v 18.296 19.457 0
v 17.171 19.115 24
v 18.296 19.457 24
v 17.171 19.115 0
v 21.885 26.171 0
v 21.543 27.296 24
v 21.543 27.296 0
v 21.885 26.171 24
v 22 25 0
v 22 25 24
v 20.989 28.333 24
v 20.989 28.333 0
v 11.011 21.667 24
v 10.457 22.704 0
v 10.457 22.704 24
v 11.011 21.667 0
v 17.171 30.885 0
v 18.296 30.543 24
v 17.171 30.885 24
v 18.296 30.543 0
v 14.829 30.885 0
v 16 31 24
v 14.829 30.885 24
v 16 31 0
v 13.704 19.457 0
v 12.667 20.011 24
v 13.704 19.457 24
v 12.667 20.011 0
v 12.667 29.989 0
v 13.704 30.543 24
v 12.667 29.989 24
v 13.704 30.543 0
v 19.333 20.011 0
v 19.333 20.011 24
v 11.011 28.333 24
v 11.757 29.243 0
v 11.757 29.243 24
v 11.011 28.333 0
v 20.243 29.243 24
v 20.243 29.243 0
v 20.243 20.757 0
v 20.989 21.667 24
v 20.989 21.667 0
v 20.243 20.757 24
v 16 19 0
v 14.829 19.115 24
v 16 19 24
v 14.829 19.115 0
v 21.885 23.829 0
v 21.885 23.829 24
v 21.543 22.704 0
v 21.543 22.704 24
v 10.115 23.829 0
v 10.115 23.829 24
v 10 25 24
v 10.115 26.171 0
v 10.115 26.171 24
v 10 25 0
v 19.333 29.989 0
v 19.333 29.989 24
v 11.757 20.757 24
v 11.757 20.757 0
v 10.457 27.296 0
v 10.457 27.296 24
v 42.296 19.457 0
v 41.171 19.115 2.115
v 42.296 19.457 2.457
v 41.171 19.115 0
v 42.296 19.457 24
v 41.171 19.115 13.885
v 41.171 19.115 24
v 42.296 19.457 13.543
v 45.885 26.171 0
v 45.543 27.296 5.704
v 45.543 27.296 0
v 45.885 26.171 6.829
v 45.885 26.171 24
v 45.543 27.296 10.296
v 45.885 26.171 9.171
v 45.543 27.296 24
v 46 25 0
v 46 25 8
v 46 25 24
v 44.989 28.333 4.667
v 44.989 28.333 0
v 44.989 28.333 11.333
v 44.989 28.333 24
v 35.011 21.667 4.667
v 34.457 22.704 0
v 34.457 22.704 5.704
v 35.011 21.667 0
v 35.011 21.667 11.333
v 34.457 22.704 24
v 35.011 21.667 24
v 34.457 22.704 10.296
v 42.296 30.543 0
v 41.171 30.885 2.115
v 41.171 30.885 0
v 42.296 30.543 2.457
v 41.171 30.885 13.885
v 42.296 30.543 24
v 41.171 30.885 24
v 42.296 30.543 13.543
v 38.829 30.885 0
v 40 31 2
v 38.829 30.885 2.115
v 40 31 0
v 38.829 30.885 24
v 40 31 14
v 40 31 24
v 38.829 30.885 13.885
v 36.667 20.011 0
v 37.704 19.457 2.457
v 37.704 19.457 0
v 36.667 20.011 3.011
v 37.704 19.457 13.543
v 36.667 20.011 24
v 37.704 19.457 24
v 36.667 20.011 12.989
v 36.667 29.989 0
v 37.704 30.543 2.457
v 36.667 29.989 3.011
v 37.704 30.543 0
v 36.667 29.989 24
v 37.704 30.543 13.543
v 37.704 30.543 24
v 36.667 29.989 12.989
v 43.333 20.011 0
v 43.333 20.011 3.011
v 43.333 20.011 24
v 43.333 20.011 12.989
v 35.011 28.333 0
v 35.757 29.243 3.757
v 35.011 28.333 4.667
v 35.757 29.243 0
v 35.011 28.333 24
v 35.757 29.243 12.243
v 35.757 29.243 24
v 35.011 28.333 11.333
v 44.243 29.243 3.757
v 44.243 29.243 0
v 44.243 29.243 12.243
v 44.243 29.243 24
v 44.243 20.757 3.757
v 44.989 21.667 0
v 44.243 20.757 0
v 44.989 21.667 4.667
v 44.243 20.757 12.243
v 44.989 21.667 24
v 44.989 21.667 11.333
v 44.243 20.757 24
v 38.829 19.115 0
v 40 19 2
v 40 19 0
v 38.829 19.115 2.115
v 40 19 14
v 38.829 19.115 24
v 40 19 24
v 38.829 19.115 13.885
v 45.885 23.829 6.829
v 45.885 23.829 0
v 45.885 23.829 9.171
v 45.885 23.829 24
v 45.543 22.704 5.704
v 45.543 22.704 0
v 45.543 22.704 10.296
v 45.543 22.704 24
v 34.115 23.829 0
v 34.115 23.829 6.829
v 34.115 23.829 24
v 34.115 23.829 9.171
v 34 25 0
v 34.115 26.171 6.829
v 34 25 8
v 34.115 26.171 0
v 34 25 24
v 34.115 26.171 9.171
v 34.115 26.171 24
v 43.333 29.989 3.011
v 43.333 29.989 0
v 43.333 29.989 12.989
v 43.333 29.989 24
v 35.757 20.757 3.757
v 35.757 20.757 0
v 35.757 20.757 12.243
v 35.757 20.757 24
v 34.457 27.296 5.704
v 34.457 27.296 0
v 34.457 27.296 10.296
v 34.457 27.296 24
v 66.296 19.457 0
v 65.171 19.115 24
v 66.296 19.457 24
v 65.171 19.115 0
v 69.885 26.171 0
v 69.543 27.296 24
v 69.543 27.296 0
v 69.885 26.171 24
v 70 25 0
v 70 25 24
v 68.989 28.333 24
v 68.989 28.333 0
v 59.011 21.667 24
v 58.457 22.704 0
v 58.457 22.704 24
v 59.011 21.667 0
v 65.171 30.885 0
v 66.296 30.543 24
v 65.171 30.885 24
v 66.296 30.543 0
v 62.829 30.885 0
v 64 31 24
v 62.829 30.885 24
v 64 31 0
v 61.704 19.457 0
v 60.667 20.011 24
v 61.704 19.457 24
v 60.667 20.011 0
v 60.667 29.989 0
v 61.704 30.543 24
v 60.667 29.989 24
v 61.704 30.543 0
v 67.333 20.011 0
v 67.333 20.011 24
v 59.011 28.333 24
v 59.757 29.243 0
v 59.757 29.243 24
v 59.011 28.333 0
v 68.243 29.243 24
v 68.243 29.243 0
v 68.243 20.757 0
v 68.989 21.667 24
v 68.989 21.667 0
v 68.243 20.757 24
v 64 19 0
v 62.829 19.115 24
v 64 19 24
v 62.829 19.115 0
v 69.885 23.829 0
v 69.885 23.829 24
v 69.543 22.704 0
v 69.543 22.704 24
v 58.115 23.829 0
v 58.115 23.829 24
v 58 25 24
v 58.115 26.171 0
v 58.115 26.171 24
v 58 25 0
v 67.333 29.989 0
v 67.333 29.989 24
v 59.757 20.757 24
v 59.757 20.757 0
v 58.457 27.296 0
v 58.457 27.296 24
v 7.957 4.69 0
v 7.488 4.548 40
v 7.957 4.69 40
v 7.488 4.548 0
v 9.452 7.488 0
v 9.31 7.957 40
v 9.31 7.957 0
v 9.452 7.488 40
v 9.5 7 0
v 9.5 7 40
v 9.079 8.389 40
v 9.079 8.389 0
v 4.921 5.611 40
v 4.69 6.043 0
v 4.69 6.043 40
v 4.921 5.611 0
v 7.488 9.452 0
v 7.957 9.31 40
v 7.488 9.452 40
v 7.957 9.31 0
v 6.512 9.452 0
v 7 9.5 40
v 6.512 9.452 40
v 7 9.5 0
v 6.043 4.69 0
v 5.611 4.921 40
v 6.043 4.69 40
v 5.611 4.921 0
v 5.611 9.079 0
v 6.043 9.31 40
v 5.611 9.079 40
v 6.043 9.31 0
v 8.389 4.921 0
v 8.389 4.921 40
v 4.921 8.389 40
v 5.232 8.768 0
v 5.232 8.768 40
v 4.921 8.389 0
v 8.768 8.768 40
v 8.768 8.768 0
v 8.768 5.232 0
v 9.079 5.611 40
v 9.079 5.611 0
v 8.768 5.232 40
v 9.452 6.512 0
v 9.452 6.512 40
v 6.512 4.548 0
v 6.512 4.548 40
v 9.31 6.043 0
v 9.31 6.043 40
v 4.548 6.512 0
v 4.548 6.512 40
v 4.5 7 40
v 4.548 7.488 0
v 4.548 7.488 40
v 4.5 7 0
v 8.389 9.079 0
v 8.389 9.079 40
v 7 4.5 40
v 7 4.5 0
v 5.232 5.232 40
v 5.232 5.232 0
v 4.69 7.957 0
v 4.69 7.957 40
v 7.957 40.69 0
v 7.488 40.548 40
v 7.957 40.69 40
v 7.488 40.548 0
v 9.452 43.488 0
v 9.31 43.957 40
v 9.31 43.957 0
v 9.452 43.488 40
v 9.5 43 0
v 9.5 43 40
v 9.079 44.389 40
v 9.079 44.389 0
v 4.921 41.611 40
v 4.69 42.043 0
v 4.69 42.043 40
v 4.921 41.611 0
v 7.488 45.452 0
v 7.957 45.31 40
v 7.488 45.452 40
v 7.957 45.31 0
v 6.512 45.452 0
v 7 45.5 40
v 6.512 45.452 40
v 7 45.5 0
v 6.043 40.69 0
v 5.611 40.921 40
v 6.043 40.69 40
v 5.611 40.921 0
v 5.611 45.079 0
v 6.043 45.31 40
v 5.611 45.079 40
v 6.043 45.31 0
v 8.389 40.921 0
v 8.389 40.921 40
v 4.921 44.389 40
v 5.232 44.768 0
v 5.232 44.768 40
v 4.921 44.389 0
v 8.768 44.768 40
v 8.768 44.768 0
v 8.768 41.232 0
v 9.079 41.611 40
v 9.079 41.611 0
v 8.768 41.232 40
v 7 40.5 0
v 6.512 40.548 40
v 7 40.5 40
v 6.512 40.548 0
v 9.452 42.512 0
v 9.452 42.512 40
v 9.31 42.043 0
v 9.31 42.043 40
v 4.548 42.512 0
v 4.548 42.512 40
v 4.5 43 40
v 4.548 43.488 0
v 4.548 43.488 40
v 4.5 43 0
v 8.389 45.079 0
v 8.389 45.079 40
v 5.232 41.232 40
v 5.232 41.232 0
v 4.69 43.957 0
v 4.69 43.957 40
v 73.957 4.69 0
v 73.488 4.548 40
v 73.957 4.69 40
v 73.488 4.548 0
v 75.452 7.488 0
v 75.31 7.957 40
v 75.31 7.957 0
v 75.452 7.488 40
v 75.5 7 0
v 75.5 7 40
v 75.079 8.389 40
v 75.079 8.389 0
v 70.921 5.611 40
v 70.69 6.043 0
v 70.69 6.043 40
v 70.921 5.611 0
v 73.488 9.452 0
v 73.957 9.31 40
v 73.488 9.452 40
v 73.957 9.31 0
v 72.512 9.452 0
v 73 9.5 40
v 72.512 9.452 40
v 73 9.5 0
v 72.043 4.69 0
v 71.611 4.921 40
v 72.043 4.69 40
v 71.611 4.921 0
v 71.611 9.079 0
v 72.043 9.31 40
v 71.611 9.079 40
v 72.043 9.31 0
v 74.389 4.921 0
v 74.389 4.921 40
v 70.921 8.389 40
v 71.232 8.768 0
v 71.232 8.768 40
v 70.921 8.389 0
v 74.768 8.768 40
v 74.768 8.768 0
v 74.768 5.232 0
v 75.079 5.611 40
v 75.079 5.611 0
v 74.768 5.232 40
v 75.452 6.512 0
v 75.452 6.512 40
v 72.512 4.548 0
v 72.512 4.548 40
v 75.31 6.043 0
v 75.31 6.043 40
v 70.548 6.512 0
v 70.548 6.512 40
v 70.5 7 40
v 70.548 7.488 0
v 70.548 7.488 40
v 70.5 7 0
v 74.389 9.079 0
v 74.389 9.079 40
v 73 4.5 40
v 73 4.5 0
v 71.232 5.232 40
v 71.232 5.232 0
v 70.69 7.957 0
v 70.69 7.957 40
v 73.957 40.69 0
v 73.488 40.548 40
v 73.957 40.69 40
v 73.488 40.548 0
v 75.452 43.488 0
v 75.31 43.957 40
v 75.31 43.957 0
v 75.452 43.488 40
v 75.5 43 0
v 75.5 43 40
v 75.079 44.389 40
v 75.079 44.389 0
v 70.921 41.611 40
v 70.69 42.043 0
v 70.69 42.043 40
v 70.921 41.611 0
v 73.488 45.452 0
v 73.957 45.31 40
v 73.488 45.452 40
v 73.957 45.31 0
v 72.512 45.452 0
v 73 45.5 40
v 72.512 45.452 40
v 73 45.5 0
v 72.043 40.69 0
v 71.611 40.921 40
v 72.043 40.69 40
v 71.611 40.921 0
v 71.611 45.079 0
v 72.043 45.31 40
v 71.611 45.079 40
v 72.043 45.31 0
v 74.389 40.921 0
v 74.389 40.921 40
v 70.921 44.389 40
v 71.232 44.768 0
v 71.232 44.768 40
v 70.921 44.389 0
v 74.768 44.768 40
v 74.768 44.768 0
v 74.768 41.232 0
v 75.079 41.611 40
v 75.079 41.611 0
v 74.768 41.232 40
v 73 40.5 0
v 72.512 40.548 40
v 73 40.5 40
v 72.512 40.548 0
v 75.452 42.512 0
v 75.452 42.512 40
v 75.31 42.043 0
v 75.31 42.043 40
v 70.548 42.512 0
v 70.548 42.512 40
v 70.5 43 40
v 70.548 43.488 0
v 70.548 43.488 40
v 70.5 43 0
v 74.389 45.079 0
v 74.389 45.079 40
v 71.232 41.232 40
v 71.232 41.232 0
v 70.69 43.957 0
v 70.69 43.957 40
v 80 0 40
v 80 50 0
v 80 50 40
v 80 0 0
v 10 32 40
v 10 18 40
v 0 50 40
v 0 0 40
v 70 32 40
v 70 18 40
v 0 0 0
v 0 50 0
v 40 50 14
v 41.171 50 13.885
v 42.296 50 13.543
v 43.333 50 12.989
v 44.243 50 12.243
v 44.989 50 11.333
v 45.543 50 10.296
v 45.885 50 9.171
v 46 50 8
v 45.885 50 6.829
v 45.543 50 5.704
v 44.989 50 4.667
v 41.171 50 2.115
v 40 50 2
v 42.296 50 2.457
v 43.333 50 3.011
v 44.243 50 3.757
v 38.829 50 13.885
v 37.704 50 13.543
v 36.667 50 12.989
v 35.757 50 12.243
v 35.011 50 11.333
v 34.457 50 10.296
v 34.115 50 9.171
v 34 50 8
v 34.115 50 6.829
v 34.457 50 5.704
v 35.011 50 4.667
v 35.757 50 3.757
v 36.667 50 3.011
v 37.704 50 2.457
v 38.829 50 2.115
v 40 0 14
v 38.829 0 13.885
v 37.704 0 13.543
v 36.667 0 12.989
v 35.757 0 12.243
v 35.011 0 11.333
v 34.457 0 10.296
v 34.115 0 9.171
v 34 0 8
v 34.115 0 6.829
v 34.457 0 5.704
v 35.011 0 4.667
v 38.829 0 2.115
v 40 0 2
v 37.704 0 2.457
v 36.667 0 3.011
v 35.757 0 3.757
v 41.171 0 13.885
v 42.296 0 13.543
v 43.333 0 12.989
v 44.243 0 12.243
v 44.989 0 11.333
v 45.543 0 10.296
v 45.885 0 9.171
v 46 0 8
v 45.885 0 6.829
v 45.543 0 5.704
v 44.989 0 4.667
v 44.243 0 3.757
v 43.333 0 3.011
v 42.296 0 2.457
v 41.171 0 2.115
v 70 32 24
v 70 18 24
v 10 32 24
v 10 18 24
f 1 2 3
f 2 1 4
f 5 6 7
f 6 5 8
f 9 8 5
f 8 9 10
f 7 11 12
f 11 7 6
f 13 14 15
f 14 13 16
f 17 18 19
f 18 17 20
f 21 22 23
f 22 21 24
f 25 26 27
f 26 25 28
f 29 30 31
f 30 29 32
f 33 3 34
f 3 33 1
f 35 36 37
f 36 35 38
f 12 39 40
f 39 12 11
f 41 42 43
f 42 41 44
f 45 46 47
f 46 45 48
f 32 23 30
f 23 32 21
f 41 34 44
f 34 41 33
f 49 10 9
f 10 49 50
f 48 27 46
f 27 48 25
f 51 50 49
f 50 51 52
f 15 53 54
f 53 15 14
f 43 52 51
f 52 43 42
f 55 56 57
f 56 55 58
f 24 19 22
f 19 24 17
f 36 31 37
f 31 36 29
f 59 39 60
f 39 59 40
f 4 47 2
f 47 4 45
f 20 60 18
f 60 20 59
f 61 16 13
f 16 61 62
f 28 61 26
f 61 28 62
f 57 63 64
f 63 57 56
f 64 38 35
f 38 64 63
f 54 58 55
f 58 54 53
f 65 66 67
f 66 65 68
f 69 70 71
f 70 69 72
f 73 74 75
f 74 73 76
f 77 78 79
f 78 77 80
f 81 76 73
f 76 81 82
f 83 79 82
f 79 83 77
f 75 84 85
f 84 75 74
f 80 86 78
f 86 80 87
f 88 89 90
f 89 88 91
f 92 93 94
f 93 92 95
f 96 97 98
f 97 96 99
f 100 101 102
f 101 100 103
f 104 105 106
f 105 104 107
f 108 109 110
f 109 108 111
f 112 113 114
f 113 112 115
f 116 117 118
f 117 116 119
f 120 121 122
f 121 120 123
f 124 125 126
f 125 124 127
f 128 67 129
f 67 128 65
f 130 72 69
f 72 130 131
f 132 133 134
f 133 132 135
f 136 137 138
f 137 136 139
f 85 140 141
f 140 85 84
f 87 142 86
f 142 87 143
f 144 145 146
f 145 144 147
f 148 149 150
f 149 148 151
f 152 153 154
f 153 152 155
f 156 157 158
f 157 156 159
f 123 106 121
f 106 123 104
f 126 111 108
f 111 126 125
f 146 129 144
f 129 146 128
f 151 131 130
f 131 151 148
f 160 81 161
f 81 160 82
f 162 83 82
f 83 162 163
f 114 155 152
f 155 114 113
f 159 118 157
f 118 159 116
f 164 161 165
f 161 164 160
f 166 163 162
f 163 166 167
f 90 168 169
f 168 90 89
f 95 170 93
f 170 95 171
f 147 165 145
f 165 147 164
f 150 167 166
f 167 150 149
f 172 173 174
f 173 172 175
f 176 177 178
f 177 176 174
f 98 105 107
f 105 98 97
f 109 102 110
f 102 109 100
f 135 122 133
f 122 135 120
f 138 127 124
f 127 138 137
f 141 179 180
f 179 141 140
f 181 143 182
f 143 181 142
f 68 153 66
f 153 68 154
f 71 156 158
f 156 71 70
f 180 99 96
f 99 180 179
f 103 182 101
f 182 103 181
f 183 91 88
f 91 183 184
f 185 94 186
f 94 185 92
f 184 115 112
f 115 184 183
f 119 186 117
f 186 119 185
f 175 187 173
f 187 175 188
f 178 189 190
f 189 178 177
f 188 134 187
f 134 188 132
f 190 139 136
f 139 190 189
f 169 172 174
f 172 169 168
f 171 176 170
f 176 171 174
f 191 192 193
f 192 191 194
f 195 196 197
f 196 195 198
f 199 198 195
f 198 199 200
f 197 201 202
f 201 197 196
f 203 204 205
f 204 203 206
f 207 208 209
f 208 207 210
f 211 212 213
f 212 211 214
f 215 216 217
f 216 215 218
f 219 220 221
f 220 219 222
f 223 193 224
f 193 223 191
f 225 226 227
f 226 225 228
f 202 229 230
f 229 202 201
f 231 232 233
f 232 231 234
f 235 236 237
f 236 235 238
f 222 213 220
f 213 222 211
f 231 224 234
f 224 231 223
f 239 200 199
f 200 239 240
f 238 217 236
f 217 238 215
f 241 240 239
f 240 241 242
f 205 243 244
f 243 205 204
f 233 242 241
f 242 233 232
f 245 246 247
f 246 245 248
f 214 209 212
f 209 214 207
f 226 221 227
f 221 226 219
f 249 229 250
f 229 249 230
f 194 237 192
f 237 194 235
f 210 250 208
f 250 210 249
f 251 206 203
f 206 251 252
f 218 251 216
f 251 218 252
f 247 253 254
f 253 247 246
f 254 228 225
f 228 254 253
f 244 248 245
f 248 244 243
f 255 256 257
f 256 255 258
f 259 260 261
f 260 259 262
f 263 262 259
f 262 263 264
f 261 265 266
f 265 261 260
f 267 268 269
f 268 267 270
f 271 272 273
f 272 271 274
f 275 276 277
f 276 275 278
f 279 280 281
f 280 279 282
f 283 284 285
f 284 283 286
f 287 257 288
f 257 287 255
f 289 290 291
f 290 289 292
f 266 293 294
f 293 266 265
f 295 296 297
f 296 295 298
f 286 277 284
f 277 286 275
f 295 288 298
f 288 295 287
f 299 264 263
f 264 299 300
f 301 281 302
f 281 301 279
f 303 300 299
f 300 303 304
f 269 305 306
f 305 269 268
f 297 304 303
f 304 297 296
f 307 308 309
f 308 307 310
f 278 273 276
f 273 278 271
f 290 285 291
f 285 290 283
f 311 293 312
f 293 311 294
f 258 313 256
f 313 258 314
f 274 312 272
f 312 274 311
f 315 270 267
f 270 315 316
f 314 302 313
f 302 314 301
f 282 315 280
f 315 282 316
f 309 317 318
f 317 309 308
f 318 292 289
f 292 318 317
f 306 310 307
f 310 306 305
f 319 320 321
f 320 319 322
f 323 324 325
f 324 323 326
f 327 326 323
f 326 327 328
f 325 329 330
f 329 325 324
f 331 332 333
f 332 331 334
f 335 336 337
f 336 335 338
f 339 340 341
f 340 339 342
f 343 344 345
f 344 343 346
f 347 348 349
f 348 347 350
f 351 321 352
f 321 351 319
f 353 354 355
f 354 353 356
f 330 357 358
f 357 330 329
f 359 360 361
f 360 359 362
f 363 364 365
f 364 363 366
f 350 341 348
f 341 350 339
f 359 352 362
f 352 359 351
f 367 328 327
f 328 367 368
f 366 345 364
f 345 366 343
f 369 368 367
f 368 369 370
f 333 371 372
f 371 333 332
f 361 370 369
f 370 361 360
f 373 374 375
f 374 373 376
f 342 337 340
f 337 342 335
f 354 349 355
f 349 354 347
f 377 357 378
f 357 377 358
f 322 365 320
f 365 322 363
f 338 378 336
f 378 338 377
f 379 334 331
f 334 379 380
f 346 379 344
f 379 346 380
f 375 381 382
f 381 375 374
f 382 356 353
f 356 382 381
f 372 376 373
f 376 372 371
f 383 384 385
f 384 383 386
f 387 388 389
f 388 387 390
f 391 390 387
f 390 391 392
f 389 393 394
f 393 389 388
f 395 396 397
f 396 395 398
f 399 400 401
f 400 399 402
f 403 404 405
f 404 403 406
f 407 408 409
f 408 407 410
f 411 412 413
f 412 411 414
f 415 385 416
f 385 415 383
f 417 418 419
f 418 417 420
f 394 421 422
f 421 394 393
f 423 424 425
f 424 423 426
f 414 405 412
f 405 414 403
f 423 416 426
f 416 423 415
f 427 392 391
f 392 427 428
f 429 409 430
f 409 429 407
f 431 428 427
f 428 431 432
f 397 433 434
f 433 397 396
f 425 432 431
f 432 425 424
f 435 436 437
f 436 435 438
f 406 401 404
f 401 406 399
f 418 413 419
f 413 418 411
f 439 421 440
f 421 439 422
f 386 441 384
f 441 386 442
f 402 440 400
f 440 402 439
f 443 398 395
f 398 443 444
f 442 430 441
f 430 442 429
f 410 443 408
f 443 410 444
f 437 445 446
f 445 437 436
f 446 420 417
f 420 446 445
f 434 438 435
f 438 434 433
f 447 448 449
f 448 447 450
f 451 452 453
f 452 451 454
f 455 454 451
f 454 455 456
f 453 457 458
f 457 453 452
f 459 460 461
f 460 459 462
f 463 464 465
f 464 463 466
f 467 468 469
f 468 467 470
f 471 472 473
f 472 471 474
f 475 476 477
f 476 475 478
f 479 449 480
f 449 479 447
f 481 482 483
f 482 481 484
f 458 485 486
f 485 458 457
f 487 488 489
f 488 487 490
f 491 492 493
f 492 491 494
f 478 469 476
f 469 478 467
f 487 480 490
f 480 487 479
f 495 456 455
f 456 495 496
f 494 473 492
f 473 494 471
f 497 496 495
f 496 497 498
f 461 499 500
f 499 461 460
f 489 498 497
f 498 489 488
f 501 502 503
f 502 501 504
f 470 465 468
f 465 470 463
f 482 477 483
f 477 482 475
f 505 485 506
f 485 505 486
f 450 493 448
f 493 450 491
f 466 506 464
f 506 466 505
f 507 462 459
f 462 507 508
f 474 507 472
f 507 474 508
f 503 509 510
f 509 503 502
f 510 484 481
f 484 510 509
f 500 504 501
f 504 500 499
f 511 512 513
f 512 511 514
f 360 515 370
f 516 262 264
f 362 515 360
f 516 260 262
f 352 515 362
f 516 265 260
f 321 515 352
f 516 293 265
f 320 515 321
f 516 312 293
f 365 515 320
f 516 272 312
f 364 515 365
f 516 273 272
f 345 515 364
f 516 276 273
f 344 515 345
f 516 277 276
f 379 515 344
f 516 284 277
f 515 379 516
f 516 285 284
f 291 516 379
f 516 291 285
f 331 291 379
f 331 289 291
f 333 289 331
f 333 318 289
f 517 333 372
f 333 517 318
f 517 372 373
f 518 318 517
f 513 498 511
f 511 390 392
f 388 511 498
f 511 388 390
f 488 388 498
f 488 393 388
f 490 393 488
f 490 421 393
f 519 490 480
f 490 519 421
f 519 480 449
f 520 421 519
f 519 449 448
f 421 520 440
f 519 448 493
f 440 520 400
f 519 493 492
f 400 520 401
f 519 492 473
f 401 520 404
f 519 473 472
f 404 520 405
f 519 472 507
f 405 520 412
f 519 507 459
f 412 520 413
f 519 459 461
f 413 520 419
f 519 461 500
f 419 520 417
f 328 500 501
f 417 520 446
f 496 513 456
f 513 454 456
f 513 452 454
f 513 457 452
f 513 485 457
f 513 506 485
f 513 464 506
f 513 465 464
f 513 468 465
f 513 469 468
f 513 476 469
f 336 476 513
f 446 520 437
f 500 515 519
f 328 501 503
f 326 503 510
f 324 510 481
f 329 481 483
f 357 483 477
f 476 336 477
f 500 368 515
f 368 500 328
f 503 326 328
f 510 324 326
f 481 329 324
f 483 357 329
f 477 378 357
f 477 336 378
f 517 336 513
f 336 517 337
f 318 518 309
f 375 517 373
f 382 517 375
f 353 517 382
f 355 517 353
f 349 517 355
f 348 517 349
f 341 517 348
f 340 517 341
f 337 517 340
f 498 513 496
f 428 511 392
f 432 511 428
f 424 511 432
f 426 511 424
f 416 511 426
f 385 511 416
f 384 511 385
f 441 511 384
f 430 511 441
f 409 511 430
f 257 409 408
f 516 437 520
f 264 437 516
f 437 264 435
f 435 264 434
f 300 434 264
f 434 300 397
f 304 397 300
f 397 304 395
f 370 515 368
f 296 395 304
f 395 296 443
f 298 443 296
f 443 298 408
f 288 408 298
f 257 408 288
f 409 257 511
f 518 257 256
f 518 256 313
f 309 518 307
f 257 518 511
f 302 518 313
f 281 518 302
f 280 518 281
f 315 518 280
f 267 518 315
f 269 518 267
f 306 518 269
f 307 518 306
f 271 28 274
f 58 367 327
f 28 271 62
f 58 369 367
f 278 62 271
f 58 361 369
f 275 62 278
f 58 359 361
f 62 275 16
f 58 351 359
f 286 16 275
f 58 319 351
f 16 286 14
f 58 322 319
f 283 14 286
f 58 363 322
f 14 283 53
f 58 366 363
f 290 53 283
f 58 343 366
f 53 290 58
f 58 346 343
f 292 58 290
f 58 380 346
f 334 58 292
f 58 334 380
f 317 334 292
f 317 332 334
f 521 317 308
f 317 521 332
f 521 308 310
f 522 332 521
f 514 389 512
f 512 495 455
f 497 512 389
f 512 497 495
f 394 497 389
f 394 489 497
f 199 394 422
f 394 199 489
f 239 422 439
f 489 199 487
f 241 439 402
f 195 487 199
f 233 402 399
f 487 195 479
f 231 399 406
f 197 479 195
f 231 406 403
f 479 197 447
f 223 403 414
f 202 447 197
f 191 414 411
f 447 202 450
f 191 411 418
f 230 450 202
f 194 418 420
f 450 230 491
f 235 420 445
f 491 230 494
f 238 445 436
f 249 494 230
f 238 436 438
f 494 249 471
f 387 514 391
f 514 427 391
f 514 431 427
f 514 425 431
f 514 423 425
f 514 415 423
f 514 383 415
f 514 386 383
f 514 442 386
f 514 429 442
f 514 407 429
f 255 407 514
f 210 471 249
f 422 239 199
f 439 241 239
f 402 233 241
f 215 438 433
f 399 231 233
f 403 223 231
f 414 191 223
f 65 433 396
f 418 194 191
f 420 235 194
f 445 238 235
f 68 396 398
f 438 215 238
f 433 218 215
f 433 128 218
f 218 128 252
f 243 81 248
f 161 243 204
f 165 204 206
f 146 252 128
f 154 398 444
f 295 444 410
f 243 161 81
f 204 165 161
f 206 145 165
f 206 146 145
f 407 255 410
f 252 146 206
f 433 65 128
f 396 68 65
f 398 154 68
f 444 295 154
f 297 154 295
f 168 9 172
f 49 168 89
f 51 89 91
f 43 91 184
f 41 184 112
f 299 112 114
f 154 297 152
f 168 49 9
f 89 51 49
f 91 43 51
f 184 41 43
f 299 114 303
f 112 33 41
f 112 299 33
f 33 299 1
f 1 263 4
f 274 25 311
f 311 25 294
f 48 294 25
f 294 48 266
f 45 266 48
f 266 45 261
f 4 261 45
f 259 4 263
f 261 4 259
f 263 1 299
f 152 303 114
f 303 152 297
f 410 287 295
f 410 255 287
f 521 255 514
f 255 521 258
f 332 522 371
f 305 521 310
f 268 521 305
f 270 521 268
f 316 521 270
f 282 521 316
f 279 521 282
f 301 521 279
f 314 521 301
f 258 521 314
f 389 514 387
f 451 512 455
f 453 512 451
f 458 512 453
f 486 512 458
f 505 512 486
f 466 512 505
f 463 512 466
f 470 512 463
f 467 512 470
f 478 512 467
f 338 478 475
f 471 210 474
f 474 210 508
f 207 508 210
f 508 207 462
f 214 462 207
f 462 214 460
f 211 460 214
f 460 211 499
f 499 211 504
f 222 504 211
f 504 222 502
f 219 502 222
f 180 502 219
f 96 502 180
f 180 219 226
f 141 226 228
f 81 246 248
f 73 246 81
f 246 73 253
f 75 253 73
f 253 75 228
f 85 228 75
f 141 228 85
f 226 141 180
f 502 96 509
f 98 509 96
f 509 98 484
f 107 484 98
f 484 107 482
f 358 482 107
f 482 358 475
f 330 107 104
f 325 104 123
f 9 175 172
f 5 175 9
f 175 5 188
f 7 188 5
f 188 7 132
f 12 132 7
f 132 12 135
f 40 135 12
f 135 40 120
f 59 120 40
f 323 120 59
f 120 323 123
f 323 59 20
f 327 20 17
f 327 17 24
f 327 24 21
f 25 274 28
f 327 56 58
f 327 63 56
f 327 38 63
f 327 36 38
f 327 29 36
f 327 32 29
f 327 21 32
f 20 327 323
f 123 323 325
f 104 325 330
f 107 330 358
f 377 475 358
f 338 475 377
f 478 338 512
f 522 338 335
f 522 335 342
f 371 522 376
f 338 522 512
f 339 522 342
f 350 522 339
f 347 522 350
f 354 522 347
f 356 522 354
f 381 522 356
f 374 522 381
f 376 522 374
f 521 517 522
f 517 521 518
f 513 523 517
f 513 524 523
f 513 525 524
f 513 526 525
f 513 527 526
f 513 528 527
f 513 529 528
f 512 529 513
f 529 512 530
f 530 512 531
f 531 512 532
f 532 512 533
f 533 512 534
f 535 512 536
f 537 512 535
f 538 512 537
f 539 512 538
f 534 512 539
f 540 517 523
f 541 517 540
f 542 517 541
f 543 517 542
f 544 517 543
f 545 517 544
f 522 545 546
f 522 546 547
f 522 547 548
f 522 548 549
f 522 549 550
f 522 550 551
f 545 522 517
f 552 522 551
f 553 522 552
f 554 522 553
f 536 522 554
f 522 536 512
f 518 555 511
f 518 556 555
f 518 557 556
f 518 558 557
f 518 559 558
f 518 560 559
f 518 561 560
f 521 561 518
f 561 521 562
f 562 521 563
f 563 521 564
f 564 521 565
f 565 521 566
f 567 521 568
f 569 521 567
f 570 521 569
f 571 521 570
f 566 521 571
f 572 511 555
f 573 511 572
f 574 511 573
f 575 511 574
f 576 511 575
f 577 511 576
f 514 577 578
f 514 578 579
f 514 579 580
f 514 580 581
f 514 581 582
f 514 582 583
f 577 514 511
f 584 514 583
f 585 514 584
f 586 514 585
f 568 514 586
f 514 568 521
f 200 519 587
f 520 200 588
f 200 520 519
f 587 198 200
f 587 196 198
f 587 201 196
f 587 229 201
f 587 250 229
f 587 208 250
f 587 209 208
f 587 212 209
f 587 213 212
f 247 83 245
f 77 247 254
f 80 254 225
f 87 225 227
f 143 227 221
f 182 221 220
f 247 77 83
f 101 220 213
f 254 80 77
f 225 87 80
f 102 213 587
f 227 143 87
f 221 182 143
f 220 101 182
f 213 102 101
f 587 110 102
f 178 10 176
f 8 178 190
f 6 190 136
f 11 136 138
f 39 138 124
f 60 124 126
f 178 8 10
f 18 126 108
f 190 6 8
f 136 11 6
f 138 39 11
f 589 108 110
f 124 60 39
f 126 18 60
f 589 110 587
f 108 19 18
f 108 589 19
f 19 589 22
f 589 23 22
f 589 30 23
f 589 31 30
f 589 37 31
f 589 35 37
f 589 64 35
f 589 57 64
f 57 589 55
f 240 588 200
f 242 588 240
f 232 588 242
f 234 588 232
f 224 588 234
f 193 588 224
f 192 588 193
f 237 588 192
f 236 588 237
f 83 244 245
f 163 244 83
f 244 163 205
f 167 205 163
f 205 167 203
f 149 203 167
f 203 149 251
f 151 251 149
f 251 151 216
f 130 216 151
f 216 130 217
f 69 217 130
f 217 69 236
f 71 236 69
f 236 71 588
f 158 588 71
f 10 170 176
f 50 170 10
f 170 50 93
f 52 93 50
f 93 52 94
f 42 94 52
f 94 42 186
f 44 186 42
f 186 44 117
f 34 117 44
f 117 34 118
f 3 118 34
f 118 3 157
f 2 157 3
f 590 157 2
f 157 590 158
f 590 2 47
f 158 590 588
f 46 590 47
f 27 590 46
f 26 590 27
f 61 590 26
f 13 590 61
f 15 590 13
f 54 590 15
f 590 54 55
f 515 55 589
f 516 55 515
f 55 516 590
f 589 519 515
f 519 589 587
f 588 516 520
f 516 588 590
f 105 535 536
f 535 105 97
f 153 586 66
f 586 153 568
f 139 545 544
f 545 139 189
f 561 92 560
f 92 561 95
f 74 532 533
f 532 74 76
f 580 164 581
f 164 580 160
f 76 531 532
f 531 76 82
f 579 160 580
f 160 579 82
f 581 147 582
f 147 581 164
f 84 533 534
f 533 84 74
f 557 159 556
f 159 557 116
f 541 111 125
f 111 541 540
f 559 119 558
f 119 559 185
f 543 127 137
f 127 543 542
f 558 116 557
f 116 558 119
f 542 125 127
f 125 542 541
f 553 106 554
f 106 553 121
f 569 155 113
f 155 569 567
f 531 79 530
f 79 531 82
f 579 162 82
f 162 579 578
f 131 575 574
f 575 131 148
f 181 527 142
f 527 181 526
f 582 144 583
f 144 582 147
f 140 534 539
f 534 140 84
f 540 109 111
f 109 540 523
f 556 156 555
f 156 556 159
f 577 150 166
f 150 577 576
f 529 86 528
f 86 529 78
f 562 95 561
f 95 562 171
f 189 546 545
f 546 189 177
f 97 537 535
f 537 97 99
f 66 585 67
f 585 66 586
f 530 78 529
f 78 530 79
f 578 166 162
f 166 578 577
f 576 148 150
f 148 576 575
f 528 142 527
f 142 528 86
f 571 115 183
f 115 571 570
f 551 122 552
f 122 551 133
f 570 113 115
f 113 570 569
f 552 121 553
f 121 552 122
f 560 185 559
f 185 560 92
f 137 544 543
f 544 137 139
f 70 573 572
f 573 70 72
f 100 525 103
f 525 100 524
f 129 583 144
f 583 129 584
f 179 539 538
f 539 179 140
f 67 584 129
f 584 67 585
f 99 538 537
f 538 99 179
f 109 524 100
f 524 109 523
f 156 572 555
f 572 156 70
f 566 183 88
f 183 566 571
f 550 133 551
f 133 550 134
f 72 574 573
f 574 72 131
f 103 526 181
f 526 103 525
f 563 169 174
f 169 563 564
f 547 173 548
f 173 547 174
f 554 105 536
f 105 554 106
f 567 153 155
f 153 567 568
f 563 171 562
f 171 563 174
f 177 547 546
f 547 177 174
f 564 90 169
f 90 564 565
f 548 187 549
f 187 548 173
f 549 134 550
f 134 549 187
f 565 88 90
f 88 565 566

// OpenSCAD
$fn = 32;

// ----------------------------------------------------------------------
// Manifold block: side_outlet manifold
// ----------------------------------------------------------------------

// --- parameters (mm) ---
block_l = 80;             // block length, X
block_w = 50;             // block width, Y
block_h = 40;             // block height, Z
port_d = 12;              // port bore diameter
port_pitch = 24;          // port pitch along X
gallery_d = 14;           // top gallery width, Y
gallery_depth = 16;       // gallery pocket depth
wall_p = 10;              // gallery end wall thickness, X
mnt_d = 5;                // mounting hole diameter
mnt_in = 7;               // mounting hole inset from the edges
out_d = 12;               // outlet bore diameter
out_z = 8;                // outlet axis height

n_ports = 3;  // ports in the row
port_x0 = (block_l - (n_ports - 1) * port_pitch) / 2;  // first port X

difference() {
  cube([block_l, block_w, block_h]);
  for (i = [0 : n_ports - 1])
    translate([port_x0 + i * port_pitch, block_w / 2, -1])
      cylinder(h = block_h + 2, d = port_d);
  translate([wall_p, block_w / 2 - gallery_d / 2, block_h - gallery_depth])
    cube([block_l - 2 * wall_p, gallery_d, gallery_depth + 1]);
  for (cx = [mnt_in, block_l - mnt_in])
    for (cy = [mnt_in, block_w - mnt_in])
      translate([cx, cy, -1]) cylinder(h = block_h + 2, d = mnt_d);
  translate([block_l / 2, -1, out_z]) rotate([-90, 0, 0])
    cylinder(h = block_w + 2, d = out_d);
}
